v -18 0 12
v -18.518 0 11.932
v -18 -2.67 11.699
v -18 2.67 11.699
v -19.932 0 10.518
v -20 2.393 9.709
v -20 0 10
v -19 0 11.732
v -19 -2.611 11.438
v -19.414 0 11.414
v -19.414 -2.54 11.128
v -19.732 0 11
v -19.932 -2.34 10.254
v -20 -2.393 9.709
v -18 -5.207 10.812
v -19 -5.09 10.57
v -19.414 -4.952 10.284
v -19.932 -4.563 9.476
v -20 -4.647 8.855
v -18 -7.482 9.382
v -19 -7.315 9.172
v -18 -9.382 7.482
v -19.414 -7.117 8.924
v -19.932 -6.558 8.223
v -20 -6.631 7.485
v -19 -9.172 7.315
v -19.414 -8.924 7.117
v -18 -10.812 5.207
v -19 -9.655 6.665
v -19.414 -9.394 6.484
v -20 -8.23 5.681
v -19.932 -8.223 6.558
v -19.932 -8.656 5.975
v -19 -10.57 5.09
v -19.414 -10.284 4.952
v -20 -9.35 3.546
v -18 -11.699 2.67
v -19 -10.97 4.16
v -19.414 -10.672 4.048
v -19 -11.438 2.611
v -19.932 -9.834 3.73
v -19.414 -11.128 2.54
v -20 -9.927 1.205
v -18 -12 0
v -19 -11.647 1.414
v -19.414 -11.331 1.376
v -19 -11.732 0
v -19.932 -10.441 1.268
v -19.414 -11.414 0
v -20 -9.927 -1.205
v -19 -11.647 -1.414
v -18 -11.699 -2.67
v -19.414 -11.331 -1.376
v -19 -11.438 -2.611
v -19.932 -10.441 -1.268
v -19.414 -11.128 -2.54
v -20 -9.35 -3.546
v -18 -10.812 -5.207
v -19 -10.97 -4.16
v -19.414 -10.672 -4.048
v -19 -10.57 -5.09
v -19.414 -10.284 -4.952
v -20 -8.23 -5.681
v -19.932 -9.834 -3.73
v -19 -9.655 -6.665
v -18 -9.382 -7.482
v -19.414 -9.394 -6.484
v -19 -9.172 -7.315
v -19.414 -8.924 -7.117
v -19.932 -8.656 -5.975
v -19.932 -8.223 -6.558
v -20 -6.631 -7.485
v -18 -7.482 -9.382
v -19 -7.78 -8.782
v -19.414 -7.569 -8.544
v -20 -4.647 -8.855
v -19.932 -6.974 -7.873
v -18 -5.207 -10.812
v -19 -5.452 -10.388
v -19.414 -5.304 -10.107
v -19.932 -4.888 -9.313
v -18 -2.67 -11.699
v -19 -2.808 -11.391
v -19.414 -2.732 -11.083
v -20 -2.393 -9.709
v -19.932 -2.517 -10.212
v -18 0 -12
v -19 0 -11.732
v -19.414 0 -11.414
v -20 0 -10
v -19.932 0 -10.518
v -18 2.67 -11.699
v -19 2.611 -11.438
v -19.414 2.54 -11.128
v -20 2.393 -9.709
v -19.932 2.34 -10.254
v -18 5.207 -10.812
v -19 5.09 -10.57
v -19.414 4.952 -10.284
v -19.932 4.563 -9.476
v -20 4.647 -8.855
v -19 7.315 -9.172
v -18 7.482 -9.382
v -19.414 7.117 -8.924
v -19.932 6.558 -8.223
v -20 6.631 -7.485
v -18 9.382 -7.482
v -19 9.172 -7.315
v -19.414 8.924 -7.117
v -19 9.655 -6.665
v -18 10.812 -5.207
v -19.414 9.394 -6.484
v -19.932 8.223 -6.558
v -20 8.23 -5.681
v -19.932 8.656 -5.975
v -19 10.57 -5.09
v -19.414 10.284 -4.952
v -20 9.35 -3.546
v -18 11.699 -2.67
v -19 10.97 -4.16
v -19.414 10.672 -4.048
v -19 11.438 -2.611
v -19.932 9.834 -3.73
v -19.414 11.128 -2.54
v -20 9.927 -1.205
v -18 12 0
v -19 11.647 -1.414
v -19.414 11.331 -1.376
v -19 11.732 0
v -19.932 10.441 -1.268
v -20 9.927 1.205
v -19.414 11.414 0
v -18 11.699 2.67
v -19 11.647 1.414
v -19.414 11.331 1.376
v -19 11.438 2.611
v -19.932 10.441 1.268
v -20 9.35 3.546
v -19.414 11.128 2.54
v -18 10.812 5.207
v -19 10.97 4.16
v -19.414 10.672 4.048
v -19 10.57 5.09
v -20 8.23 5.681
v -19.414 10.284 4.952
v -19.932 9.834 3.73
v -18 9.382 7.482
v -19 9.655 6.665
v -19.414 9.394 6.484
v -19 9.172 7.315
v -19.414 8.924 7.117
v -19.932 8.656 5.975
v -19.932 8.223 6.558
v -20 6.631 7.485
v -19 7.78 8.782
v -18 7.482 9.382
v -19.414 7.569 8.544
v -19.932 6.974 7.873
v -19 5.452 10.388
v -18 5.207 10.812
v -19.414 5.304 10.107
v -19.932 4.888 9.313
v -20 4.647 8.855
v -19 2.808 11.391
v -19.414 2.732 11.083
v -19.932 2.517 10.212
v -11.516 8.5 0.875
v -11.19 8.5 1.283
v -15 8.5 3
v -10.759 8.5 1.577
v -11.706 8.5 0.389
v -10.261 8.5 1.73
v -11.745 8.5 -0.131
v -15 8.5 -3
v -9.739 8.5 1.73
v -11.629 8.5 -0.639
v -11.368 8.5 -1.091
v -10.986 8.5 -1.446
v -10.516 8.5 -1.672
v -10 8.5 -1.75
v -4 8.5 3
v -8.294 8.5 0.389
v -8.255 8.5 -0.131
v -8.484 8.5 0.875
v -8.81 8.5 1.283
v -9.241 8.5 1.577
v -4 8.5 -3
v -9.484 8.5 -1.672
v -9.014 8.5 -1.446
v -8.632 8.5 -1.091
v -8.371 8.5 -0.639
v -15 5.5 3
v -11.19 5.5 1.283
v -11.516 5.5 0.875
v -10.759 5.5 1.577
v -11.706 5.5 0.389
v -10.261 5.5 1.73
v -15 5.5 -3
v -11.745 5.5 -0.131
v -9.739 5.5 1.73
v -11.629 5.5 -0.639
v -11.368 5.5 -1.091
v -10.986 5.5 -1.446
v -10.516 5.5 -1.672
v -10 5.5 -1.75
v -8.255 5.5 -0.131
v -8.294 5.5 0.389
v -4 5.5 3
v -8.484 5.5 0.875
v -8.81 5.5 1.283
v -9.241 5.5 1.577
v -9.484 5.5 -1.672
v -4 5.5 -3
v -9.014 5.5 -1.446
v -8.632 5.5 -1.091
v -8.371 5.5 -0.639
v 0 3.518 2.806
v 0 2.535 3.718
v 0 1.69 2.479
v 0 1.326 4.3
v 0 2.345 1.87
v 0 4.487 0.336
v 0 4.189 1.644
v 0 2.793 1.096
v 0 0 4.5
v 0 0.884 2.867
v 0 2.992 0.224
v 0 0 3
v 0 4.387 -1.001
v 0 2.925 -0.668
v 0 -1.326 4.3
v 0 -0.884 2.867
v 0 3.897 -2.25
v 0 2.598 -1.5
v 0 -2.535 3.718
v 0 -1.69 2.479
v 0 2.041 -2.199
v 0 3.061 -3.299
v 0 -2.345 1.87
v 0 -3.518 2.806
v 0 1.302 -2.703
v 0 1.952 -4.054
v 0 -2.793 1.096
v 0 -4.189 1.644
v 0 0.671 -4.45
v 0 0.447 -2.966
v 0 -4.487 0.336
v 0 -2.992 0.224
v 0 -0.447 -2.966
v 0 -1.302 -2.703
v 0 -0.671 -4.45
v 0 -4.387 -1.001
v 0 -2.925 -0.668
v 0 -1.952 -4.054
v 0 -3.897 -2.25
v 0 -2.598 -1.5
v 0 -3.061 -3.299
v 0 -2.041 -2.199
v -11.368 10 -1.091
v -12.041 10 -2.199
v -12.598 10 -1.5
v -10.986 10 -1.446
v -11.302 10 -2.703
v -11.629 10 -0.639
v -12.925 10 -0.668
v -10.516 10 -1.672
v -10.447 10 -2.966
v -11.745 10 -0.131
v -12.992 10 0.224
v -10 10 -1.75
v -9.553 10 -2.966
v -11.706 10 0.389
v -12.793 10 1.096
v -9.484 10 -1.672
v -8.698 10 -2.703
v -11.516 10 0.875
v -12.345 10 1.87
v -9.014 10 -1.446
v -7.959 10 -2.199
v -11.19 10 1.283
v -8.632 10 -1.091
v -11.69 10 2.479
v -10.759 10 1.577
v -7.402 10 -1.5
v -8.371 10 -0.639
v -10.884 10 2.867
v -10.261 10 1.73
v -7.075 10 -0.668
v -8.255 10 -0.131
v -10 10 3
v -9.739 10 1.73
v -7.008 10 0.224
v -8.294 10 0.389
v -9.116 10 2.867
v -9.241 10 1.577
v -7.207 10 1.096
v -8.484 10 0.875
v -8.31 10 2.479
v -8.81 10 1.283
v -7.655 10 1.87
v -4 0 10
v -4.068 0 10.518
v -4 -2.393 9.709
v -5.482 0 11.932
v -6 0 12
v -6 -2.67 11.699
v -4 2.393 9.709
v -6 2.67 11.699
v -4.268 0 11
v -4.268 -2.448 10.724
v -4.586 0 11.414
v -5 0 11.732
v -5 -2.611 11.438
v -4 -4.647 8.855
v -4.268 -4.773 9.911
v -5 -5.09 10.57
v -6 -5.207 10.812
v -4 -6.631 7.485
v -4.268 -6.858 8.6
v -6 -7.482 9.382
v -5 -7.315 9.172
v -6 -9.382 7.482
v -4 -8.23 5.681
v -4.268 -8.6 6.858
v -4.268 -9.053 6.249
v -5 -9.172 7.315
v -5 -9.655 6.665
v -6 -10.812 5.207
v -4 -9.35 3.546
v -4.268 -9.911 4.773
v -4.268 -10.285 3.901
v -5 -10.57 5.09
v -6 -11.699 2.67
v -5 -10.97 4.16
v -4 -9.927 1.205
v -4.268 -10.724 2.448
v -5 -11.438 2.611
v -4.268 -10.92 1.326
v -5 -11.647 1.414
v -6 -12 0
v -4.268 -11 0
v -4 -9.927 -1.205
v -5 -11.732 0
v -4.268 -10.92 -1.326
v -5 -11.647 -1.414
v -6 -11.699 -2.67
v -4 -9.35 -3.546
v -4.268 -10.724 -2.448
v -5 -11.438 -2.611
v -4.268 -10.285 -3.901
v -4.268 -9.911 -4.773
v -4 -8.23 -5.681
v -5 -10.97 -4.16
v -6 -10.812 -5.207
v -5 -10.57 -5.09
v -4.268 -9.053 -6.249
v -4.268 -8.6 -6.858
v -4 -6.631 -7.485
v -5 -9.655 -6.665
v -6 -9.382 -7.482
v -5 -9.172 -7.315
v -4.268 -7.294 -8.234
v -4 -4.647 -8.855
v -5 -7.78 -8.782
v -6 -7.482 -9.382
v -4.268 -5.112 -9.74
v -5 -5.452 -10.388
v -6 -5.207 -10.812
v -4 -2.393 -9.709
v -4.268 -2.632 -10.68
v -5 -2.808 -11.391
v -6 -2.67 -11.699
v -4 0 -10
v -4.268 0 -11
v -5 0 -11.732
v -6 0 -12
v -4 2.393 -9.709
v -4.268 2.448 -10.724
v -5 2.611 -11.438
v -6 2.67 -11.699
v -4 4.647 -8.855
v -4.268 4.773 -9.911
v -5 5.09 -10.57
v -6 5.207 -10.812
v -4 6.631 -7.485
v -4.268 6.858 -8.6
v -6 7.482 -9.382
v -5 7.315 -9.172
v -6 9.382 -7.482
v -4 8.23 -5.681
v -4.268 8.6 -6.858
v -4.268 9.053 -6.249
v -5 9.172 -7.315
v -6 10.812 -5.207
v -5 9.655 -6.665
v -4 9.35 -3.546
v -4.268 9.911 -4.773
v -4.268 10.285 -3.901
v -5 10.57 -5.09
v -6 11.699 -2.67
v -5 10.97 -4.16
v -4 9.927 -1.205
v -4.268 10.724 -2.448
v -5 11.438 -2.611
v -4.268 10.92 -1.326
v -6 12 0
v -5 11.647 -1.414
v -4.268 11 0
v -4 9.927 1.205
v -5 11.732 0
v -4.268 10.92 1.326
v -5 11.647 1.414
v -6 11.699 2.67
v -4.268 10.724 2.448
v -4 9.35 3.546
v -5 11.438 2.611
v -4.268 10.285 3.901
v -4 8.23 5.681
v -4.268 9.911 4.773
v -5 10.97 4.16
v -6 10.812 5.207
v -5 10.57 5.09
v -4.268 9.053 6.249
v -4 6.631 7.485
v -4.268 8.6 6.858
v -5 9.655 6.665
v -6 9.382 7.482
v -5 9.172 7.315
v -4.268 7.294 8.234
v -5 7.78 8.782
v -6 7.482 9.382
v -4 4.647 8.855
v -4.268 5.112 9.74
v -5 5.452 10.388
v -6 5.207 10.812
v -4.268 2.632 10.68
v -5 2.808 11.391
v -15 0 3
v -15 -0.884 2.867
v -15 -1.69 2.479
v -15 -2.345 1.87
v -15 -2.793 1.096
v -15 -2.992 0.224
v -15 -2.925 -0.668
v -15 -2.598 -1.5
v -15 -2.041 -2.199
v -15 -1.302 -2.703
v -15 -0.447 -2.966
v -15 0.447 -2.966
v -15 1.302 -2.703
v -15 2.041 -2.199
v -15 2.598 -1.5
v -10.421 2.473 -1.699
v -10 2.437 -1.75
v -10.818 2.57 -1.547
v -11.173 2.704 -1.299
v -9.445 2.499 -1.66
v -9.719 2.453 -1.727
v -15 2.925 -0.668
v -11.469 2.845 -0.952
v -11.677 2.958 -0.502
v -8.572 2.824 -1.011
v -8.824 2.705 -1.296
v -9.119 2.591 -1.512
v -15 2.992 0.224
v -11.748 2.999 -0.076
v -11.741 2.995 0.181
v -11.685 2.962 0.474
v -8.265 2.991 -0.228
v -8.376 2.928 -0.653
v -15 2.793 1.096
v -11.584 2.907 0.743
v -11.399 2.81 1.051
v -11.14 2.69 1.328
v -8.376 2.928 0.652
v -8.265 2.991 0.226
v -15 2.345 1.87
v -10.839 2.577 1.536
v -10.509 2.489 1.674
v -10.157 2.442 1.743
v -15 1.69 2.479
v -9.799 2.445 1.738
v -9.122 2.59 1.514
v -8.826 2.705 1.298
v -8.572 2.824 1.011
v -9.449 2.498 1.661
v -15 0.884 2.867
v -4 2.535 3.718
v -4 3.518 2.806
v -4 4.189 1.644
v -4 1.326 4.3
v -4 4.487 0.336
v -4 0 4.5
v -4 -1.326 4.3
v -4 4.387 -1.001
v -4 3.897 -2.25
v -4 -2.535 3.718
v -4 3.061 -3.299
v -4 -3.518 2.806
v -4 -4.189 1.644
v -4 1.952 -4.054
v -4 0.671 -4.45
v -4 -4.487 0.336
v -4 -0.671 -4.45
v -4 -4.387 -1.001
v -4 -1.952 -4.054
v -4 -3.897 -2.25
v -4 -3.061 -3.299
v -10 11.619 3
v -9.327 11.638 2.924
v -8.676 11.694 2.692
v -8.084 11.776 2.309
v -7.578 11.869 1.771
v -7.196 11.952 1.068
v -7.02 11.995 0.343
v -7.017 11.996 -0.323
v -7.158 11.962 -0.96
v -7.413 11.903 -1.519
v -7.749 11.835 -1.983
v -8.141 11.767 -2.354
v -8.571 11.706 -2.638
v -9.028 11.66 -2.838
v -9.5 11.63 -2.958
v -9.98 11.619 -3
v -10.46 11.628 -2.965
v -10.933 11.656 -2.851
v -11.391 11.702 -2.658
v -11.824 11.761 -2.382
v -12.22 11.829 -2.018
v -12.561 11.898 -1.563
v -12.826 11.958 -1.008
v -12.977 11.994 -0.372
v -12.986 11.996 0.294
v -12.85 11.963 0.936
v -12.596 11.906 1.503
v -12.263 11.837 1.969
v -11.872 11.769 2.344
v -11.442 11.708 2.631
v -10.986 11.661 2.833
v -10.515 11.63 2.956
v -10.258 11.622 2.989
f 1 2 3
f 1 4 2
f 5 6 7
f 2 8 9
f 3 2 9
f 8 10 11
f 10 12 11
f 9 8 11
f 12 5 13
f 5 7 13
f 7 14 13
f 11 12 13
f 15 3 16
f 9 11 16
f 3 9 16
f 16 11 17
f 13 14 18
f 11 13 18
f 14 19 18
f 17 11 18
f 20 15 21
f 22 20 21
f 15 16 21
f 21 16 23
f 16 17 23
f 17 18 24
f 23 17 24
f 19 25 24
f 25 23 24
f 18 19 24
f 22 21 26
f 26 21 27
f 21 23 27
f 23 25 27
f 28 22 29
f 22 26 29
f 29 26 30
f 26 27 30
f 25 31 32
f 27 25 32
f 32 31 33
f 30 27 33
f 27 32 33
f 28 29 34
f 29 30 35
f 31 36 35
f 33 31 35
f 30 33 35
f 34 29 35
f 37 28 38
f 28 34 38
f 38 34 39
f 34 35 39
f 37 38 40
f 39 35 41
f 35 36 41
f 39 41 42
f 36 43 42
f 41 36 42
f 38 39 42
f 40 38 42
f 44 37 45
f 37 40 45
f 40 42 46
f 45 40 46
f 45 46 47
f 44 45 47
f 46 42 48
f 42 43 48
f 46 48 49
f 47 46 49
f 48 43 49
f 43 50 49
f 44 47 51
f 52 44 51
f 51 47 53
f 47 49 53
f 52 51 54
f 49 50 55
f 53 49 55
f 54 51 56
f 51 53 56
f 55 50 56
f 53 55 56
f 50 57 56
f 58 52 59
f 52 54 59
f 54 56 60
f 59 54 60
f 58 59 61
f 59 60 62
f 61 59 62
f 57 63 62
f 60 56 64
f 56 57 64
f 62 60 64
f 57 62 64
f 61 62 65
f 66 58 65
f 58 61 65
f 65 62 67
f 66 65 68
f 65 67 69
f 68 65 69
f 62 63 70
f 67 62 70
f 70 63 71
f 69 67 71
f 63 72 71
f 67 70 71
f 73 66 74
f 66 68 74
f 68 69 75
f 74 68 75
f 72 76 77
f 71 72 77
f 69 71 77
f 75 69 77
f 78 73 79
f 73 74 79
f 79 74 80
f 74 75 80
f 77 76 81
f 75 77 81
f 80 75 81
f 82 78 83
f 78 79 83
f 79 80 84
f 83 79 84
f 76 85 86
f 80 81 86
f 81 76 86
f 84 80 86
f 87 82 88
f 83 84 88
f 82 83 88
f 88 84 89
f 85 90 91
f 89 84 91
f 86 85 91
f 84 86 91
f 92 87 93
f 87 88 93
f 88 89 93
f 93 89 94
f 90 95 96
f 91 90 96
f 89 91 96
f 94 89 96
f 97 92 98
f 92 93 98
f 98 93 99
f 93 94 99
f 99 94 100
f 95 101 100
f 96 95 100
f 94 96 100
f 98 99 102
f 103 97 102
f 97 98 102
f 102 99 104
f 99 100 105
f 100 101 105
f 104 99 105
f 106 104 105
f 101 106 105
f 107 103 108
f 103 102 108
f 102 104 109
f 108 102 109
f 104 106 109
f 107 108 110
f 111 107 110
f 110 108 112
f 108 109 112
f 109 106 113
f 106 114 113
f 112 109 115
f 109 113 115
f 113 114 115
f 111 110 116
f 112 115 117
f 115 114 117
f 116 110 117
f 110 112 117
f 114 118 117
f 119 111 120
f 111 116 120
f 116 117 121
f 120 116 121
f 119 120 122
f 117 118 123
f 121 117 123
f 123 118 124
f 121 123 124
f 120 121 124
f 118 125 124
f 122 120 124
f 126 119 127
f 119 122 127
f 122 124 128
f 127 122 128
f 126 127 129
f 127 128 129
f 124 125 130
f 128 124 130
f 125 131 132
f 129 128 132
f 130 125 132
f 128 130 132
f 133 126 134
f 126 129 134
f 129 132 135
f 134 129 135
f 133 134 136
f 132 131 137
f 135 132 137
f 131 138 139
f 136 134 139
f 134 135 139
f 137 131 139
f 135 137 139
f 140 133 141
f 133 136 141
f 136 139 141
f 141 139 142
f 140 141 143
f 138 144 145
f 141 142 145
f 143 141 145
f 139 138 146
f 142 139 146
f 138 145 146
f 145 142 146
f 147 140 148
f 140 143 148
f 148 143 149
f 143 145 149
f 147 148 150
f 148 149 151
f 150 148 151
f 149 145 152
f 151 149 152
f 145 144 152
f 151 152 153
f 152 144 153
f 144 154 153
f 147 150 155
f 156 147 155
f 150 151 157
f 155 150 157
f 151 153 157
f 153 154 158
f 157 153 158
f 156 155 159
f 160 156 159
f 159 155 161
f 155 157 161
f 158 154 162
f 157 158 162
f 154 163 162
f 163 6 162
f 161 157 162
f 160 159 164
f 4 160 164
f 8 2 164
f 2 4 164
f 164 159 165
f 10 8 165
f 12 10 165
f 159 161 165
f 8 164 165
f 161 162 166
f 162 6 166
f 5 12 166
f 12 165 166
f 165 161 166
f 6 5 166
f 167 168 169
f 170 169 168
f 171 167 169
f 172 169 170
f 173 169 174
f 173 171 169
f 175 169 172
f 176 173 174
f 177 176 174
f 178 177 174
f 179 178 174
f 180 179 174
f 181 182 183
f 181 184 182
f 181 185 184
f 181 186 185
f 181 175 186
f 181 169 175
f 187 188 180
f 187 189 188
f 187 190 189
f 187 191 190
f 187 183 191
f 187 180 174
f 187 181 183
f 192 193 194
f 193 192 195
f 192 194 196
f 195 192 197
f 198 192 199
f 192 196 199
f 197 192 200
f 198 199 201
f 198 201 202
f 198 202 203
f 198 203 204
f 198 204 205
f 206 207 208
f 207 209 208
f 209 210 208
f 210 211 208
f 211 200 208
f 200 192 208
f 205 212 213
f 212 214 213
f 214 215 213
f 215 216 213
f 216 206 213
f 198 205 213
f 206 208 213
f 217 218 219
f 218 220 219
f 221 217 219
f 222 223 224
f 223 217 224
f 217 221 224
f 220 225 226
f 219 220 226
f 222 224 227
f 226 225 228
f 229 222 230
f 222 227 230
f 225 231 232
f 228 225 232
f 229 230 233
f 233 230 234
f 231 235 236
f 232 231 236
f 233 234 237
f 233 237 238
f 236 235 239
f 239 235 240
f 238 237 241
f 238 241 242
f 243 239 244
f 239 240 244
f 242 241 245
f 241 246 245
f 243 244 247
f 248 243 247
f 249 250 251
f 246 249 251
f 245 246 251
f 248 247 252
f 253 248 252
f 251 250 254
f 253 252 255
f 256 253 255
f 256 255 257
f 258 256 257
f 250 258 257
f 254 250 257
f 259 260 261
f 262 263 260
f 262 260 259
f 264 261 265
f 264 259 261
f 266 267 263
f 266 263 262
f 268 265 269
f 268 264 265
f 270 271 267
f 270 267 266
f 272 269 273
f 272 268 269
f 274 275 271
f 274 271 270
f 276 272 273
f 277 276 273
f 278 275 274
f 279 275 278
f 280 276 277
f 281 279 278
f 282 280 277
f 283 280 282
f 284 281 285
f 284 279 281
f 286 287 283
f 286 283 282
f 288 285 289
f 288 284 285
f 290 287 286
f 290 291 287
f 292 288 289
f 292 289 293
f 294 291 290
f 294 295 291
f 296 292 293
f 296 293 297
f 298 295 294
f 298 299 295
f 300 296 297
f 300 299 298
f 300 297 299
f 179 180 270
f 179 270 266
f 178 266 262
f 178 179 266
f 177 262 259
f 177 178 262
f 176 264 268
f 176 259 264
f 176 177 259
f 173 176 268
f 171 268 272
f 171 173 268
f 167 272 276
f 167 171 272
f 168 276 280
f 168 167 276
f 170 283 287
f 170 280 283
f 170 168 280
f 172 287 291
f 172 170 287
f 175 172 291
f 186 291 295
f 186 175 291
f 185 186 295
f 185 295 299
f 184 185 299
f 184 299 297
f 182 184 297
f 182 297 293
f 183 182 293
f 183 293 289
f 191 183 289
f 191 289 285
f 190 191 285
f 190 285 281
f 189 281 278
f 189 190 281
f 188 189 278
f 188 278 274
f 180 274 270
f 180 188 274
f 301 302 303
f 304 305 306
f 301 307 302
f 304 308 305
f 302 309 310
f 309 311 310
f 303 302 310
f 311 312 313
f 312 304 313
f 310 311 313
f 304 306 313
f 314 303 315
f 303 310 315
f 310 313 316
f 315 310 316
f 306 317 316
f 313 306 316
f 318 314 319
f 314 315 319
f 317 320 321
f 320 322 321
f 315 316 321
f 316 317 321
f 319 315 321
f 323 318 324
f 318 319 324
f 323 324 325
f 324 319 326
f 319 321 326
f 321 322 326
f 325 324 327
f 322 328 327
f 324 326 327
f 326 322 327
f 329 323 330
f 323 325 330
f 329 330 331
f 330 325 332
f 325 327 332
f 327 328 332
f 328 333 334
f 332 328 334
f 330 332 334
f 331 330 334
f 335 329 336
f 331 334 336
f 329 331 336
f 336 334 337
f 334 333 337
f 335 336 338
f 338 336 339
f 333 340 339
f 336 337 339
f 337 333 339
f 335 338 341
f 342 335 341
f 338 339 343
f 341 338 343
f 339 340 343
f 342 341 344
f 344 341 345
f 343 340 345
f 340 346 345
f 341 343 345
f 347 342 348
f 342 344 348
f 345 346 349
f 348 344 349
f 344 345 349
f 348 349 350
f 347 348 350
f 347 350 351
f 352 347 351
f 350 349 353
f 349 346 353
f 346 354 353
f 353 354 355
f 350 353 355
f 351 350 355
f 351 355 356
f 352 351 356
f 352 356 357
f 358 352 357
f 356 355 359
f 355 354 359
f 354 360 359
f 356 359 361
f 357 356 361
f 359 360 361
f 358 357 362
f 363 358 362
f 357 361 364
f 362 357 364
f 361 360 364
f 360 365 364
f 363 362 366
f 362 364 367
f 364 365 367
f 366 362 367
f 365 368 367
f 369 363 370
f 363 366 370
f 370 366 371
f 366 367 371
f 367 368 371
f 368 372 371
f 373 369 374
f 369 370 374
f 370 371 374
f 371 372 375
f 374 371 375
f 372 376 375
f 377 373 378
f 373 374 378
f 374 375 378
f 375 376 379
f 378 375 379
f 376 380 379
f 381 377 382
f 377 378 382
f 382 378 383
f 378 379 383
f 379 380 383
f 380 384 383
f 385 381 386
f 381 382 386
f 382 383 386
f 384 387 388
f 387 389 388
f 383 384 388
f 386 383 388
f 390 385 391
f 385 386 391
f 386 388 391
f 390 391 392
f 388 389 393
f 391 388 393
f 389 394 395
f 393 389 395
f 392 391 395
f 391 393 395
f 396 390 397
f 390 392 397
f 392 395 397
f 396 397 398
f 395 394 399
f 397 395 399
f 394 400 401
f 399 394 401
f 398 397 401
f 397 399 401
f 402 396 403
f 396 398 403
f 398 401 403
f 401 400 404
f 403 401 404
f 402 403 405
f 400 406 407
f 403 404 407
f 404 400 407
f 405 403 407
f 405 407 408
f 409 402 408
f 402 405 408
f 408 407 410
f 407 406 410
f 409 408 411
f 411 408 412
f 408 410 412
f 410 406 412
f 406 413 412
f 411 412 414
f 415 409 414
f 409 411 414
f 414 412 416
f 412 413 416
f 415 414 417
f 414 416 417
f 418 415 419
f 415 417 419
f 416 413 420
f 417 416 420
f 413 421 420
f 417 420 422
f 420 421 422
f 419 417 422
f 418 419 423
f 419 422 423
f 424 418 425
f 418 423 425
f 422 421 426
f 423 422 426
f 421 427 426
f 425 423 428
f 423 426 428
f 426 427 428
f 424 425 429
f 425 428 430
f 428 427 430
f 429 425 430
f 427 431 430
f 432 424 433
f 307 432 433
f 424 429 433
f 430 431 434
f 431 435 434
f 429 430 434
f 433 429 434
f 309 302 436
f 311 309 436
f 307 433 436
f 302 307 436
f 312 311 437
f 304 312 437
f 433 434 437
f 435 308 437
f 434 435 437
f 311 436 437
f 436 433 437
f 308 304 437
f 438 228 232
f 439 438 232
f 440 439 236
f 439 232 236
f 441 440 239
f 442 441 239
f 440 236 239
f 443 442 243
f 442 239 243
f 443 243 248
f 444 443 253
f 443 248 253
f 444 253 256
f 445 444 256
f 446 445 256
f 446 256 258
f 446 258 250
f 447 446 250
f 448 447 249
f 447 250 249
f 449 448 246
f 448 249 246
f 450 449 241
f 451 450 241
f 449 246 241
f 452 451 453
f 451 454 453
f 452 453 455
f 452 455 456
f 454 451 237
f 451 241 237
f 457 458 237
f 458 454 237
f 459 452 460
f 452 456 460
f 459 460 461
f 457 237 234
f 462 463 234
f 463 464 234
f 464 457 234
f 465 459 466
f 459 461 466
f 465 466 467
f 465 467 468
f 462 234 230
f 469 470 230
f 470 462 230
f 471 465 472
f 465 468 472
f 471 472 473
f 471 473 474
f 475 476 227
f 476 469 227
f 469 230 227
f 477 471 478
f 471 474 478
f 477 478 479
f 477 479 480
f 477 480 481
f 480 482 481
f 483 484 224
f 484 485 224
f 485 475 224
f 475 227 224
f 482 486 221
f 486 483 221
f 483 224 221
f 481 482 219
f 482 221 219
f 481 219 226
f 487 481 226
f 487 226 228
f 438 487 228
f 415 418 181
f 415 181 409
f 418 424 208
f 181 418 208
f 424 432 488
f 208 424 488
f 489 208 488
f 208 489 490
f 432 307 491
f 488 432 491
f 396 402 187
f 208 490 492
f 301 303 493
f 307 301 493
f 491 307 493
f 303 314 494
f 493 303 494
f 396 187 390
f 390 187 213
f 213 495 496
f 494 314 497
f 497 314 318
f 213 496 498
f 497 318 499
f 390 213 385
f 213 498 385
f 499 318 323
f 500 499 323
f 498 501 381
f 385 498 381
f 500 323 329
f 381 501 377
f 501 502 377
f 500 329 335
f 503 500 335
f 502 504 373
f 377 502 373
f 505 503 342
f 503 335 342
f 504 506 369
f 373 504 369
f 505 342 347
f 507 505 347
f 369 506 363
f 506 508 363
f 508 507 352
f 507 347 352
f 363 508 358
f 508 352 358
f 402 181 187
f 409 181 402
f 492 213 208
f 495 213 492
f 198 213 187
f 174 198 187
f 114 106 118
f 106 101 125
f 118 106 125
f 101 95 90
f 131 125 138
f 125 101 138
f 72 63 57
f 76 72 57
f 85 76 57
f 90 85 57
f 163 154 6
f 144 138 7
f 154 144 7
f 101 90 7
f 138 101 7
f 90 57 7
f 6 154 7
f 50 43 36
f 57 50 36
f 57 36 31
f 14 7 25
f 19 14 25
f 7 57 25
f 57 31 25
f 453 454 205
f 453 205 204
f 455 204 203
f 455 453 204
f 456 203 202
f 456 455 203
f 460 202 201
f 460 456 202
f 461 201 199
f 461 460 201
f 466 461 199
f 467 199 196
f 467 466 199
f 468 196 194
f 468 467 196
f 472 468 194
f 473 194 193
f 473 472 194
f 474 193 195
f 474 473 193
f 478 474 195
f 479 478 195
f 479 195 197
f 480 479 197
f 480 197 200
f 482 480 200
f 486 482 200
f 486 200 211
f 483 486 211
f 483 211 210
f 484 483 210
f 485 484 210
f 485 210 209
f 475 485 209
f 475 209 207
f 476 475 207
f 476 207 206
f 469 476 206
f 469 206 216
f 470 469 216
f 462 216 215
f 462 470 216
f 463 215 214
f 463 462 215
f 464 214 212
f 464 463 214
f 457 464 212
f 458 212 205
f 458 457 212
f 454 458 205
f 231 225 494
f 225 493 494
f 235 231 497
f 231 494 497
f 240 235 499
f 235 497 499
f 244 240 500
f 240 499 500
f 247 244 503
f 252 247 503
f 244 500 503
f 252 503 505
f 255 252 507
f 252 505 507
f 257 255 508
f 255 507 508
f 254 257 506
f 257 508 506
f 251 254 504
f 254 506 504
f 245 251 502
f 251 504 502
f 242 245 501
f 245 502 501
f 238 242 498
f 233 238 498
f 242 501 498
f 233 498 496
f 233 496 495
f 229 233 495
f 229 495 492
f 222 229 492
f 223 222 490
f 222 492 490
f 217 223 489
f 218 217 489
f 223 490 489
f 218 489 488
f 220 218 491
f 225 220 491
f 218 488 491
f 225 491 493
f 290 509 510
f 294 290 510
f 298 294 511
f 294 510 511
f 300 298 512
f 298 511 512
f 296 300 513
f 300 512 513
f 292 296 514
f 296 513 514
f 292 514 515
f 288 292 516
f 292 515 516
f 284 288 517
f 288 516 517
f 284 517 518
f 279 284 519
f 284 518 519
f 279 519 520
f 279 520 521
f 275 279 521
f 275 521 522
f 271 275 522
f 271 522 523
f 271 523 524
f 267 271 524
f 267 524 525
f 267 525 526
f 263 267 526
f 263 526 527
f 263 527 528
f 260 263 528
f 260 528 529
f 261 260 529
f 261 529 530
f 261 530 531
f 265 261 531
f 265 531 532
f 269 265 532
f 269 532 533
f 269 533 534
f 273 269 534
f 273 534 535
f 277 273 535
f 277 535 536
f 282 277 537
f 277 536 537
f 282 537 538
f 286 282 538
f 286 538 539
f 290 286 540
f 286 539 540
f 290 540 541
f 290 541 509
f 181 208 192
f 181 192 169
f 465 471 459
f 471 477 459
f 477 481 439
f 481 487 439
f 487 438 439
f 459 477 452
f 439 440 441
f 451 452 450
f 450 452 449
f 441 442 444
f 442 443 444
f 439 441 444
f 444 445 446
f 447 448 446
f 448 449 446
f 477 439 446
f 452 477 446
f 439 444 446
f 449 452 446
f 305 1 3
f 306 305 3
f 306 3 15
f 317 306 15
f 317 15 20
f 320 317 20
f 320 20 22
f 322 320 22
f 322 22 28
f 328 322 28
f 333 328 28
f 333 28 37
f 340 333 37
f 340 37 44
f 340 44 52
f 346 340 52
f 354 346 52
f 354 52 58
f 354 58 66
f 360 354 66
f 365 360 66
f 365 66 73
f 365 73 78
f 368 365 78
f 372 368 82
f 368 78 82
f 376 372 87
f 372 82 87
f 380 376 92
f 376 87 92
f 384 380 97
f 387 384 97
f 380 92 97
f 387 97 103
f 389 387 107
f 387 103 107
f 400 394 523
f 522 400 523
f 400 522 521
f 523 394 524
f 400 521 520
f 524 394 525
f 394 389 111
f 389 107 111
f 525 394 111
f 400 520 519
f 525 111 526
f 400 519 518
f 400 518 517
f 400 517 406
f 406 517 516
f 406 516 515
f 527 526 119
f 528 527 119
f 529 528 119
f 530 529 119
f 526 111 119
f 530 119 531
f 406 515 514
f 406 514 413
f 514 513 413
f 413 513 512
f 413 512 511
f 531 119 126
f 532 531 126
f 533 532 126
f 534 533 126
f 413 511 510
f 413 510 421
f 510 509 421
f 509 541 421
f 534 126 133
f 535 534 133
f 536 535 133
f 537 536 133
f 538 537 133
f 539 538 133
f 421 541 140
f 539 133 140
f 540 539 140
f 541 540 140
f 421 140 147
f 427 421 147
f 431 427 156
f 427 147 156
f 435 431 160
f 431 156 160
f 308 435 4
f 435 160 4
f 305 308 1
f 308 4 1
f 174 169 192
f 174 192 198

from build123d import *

# Parameters (mm, degrees)
SKETCH_2_R          = 1.75
CUT_EXTRUDE_5_DEPTH = 27.229754097
CUT_EXTRUDE_START   = 12
SKETCH_2_4_R        = 3
CUT_EXTRUDE_6_DEPTH = 2
SKETCH_4_W          = 6
SKETCH_4_H          = 3
CUT_EXTRUDE_7_DEPTH = 15
FILLET_1_R          = 2


with BuildPart() as part:
    # 草图1 → 旋转1 (revolve)
    with BuildSketch(Plane.XY):
        Polygon((-15, 3), (0, 3), (0, 4.5), (-4, 4.5), (-4, 12), (-20, 12), (-20, 0), (-15, 0), align=None)
    revolve(axis=Axis((-12.015902685, 0, 0), (1, 0, 0)))

    # 草图2 → 切除-拉伸5 (cut, through all)
    with BuildSketch(Plane(origin=(0, 0, 0), x_dir=(1, 0, 0), z_dir=(0, 1, 0))):
        with Locations((-10, 0)):
            Circle(SKETCH_2_R)
    extrude(amount=CUT_EXTRUDE_5_DEPTH, mode=Mode.SUBTRACT)

    # 草图2<4> → 切除-拉伸6 (cut)
    with BuildSketch(Plane(origin=(0, 0, 0), x_dir=(1, 0, 0), z_dir=(0, 1, 0)).offset(CUT_EXTRUDE_START)):
        with Locations((-10, 0)):
            Circle(SKETCH_2_4_R)
    extrude(amount=-CUT_EXTRUDE_6_DEPTH, mode=Mode.SUBTRACT)

    # 草图4 → 切除-拉伸7 (cut)
    with BuildSketch(Plane(origin=(0, 0, 0), x_dir=(0, 0, -1), z_dir=(1, 0, 0))):
        with Locations((0, 7)):
            Rectangle(SKETCH_4_W, SKETCH_4_H)
    extrude(amount=-CUT_EXTRUDE_7_DEPTH, mode=Mode.SUBTRACT)

    # 圆角1
    fillet_1_edges = [part.edges().sort_by_distance(p)[0] for p in [
        (-20, -12, 0),
        (-4, -12, 0),
    ]]
    fillet(fillet_1_edges, radius=FILLET_1_R)


solid = part.part
